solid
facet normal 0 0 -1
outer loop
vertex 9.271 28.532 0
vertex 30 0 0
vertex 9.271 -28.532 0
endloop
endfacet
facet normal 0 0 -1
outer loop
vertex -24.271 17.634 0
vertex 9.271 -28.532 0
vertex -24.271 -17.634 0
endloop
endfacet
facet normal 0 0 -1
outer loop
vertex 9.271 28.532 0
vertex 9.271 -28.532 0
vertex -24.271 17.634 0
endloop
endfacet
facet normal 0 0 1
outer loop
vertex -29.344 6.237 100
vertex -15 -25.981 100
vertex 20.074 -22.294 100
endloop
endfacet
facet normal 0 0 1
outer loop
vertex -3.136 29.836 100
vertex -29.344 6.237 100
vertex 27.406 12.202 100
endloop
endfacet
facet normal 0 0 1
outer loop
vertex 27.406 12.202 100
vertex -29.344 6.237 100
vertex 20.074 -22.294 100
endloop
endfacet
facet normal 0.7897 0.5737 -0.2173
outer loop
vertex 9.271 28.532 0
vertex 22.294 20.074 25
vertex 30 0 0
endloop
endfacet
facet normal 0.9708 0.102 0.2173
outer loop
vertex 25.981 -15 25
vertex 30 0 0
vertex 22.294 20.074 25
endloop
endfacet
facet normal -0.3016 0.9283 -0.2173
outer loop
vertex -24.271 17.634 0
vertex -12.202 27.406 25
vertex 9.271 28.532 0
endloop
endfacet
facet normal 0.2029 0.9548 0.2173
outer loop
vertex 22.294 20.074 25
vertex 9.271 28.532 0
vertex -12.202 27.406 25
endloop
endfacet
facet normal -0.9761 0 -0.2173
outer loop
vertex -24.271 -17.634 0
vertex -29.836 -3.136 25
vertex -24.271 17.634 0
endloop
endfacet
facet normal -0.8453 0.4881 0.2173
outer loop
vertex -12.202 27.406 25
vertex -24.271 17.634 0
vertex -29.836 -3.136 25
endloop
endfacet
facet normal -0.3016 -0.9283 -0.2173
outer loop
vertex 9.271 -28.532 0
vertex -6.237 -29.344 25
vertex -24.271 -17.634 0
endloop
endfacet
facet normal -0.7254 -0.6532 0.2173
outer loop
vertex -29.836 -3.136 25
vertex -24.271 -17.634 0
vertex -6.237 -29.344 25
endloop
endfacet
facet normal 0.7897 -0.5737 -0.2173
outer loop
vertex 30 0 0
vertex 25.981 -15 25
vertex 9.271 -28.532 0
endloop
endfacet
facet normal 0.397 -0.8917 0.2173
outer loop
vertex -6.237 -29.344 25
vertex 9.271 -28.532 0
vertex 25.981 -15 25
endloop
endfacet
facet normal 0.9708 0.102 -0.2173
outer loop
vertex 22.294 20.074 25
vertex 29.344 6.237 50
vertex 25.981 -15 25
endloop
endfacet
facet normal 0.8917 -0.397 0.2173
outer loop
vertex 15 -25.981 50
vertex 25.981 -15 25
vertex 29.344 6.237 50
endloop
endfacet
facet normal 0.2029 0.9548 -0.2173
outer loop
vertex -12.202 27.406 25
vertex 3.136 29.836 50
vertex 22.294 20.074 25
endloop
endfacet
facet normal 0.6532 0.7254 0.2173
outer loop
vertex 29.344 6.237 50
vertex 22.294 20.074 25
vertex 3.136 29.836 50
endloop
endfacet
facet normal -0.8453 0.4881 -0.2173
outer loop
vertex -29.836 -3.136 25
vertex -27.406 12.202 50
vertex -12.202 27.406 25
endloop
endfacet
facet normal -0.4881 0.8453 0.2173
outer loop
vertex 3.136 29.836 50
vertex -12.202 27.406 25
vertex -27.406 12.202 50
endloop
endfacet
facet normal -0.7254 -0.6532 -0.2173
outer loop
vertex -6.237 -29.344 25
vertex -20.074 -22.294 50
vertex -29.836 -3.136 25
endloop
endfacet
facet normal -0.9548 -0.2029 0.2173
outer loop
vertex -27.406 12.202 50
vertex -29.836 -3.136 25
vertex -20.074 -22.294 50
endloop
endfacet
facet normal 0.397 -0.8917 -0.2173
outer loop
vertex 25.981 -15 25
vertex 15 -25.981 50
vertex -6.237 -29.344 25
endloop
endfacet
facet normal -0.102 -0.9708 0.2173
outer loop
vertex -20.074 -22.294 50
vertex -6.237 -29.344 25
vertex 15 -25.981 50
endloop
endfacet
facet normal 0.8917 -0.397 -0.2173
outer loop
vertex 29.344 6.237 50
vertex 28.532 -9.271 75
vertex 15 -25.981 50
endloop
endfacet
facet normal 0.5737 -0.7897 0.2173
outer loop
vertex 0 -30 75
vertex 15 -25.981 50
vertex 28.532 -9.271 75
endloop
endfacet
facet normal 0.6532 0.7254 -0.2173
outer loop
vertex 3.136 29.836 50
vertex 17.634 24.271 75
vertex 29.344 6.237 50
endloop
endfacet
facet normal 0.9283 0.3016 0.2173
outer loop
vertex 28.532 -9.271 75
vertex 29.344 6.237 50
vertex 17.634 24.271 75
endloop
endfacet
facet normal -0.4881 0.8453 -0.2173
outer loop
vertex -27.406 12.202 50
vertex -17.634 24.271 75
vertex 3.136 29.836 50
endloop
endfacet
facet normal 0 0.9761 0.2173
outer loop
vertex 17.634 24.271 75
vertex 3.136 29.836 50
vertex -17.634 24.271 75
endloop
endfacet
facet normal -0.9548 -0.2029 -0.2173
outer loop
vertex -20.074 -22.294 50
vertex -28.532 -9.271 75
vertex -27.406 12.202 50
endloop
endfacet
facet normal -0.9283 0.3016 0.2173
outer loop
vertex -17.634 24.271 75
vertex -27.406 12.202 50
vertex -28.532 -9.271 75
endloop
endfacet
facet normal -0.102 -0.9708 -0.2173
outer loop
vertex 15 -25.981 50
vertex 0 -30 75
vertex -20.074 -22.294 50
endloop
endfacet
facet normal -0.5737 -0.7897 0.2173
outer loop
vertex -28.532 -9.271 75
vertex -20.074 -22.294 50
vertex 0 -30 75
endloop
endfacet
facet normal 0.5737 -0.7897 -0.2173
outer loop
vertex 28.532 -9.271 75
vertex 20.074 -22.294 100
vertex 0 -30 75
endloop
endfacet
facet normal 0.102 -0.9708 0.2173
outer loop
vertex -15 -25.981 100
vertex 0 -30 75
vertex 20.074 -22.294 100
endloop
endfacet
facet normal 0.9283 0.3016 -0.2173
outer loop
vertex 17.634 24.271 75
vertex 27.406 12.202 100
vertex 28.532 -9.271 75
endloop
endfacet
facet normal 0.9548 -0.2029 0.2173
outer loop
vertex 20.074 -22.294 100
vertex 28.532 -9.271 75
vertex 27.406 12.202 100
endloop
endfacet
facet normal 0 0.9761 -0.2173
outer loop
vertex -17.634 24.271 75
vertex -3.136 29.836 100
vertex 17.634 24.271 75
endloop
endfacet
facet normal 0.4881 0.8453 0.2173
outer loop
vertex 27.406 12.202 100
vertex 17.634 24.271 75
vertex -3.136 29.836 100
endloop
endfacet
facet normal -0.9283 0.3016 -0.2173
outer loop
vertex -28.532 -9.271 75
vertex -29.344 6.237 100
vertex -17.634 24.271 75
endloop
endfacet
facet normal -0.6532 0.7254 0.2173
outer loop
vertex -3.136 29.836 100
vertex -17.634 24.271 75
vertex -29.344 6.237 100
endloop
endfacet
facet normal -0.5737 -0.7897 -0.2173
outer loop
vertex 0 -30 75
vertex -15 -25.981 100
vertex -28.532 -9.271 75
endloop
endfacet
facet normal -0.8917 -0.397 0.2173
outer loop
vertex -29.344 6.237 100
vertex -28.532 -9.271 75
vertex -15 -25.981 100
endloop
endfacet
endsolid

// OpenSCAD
// polygon extrusion vases, with twists and interference patterns
//
// github.com/pchuck/generative-3d-models
//
radius = 30;
sides = 5;
height = 100;
center = true;
convexity = 10;
//twist = 120;
twist = 120;
scale = [2, 2];
fn=10;

steps = twist * fn / 360;
step_inc = height / steps;
twist_inc = twist / steps;
echo(steps);

module simple_extruded_vase(sides, twist, radius, offset, height, scale, r) {
    translate([0, 0, offset + height / 2])
        rotate(r)

        linear_extrude(height=height, 
                       center = center, 
                       convexity=convexity, 
                       twist=twist, 
                       scale=scale, 
                       $fn=fn)
            circle(r=radius, $fn=sides);
}

module complex_extruded_vase() {
union() {
    translate([0, 0, height / 2])
        linear_extrude(height=height, 
                    center = center, 
                    convexity=convexity, 
                    twist=twist, 
                    scale=scale, 
                    $fn=fn)
            circle(r=radius, $fn=sides);
    
    for(j=[0:1:steps - 1]) {
        for(i=[0:1:15]) {
            translate([0, 0, j * step_inc + step_inc / 2.5]) {
                for(r=[0:60:180]) {
                    rotate([twist_inc * (j + 1.35) + r, 90, 0])
                        cylinder(h=height * 2, r=10, center=true);
                }
            }
            
            translate([0, 0, j * step_inc + step_inc / 1.7]) {
                for(r=[35:60:180]) {
                    rotate([twist_inc * (j + 1.7) + r, 90, 0])
                        cylinder(h=height * 2, r=10, center=true);
                }
            }
            
        }
    }
}
}


// simple twisted extrusion, with constant radius
simple_extruded_vase(5, 120, radius, 0, height, [1.0, 1.0], [0, 0, 0]);

// simple twisted extrusion, with changing radius
//simple_extruded_vase(5, 120, radius, 0, height, [0.5, 0.5], [0, 0, 0]);

// with interference patterns/holes
/*
difference() {
    simple_extruded_vase(5, twist, radius, 0, height, [1.0, 1.0], [0, 0, 0]);

    translate([0, 0, height / 2]) 
      cylinder(h=height * (steps - 1) / steps, d1=2 * radius * 0.82, d2=2 * radius * 0.85, center=true);
    
    translate([0, 0, height])
        cylinder(h=11, d1=2*radius * 0.85, d2=2*radius * 0.7, center=true);
}
*/


// with varying radius
/*
simple_extruded_vase(5, 180, radius, 0, height / 2, [1.0, 1.0], [0, 0, 0]);
simple_extruded_vase(5, 180, radius, height / 2, height / 2, [1, 1], [0, 0, 27]);
simple_extruded_vase(5, 180, radius, height, height / 2, [0, 0], [0, 0, -3]);
*/


// with varying, increasing radius
/*
simple_extruded_vase(8, 60, radius, 0, height / 3, [1.25, 1.75], [0, 180, 180]);
simple_extruded_vase(8, 60, radius, height / 3, height / 3, [1.25, 1.25], [0, 0, 0]);
simple_extruded_vase(8, 60, radius * 1.25, height / 3 * 2, height / 3, [2, 1.5], [0, 0, 30]);
*/
